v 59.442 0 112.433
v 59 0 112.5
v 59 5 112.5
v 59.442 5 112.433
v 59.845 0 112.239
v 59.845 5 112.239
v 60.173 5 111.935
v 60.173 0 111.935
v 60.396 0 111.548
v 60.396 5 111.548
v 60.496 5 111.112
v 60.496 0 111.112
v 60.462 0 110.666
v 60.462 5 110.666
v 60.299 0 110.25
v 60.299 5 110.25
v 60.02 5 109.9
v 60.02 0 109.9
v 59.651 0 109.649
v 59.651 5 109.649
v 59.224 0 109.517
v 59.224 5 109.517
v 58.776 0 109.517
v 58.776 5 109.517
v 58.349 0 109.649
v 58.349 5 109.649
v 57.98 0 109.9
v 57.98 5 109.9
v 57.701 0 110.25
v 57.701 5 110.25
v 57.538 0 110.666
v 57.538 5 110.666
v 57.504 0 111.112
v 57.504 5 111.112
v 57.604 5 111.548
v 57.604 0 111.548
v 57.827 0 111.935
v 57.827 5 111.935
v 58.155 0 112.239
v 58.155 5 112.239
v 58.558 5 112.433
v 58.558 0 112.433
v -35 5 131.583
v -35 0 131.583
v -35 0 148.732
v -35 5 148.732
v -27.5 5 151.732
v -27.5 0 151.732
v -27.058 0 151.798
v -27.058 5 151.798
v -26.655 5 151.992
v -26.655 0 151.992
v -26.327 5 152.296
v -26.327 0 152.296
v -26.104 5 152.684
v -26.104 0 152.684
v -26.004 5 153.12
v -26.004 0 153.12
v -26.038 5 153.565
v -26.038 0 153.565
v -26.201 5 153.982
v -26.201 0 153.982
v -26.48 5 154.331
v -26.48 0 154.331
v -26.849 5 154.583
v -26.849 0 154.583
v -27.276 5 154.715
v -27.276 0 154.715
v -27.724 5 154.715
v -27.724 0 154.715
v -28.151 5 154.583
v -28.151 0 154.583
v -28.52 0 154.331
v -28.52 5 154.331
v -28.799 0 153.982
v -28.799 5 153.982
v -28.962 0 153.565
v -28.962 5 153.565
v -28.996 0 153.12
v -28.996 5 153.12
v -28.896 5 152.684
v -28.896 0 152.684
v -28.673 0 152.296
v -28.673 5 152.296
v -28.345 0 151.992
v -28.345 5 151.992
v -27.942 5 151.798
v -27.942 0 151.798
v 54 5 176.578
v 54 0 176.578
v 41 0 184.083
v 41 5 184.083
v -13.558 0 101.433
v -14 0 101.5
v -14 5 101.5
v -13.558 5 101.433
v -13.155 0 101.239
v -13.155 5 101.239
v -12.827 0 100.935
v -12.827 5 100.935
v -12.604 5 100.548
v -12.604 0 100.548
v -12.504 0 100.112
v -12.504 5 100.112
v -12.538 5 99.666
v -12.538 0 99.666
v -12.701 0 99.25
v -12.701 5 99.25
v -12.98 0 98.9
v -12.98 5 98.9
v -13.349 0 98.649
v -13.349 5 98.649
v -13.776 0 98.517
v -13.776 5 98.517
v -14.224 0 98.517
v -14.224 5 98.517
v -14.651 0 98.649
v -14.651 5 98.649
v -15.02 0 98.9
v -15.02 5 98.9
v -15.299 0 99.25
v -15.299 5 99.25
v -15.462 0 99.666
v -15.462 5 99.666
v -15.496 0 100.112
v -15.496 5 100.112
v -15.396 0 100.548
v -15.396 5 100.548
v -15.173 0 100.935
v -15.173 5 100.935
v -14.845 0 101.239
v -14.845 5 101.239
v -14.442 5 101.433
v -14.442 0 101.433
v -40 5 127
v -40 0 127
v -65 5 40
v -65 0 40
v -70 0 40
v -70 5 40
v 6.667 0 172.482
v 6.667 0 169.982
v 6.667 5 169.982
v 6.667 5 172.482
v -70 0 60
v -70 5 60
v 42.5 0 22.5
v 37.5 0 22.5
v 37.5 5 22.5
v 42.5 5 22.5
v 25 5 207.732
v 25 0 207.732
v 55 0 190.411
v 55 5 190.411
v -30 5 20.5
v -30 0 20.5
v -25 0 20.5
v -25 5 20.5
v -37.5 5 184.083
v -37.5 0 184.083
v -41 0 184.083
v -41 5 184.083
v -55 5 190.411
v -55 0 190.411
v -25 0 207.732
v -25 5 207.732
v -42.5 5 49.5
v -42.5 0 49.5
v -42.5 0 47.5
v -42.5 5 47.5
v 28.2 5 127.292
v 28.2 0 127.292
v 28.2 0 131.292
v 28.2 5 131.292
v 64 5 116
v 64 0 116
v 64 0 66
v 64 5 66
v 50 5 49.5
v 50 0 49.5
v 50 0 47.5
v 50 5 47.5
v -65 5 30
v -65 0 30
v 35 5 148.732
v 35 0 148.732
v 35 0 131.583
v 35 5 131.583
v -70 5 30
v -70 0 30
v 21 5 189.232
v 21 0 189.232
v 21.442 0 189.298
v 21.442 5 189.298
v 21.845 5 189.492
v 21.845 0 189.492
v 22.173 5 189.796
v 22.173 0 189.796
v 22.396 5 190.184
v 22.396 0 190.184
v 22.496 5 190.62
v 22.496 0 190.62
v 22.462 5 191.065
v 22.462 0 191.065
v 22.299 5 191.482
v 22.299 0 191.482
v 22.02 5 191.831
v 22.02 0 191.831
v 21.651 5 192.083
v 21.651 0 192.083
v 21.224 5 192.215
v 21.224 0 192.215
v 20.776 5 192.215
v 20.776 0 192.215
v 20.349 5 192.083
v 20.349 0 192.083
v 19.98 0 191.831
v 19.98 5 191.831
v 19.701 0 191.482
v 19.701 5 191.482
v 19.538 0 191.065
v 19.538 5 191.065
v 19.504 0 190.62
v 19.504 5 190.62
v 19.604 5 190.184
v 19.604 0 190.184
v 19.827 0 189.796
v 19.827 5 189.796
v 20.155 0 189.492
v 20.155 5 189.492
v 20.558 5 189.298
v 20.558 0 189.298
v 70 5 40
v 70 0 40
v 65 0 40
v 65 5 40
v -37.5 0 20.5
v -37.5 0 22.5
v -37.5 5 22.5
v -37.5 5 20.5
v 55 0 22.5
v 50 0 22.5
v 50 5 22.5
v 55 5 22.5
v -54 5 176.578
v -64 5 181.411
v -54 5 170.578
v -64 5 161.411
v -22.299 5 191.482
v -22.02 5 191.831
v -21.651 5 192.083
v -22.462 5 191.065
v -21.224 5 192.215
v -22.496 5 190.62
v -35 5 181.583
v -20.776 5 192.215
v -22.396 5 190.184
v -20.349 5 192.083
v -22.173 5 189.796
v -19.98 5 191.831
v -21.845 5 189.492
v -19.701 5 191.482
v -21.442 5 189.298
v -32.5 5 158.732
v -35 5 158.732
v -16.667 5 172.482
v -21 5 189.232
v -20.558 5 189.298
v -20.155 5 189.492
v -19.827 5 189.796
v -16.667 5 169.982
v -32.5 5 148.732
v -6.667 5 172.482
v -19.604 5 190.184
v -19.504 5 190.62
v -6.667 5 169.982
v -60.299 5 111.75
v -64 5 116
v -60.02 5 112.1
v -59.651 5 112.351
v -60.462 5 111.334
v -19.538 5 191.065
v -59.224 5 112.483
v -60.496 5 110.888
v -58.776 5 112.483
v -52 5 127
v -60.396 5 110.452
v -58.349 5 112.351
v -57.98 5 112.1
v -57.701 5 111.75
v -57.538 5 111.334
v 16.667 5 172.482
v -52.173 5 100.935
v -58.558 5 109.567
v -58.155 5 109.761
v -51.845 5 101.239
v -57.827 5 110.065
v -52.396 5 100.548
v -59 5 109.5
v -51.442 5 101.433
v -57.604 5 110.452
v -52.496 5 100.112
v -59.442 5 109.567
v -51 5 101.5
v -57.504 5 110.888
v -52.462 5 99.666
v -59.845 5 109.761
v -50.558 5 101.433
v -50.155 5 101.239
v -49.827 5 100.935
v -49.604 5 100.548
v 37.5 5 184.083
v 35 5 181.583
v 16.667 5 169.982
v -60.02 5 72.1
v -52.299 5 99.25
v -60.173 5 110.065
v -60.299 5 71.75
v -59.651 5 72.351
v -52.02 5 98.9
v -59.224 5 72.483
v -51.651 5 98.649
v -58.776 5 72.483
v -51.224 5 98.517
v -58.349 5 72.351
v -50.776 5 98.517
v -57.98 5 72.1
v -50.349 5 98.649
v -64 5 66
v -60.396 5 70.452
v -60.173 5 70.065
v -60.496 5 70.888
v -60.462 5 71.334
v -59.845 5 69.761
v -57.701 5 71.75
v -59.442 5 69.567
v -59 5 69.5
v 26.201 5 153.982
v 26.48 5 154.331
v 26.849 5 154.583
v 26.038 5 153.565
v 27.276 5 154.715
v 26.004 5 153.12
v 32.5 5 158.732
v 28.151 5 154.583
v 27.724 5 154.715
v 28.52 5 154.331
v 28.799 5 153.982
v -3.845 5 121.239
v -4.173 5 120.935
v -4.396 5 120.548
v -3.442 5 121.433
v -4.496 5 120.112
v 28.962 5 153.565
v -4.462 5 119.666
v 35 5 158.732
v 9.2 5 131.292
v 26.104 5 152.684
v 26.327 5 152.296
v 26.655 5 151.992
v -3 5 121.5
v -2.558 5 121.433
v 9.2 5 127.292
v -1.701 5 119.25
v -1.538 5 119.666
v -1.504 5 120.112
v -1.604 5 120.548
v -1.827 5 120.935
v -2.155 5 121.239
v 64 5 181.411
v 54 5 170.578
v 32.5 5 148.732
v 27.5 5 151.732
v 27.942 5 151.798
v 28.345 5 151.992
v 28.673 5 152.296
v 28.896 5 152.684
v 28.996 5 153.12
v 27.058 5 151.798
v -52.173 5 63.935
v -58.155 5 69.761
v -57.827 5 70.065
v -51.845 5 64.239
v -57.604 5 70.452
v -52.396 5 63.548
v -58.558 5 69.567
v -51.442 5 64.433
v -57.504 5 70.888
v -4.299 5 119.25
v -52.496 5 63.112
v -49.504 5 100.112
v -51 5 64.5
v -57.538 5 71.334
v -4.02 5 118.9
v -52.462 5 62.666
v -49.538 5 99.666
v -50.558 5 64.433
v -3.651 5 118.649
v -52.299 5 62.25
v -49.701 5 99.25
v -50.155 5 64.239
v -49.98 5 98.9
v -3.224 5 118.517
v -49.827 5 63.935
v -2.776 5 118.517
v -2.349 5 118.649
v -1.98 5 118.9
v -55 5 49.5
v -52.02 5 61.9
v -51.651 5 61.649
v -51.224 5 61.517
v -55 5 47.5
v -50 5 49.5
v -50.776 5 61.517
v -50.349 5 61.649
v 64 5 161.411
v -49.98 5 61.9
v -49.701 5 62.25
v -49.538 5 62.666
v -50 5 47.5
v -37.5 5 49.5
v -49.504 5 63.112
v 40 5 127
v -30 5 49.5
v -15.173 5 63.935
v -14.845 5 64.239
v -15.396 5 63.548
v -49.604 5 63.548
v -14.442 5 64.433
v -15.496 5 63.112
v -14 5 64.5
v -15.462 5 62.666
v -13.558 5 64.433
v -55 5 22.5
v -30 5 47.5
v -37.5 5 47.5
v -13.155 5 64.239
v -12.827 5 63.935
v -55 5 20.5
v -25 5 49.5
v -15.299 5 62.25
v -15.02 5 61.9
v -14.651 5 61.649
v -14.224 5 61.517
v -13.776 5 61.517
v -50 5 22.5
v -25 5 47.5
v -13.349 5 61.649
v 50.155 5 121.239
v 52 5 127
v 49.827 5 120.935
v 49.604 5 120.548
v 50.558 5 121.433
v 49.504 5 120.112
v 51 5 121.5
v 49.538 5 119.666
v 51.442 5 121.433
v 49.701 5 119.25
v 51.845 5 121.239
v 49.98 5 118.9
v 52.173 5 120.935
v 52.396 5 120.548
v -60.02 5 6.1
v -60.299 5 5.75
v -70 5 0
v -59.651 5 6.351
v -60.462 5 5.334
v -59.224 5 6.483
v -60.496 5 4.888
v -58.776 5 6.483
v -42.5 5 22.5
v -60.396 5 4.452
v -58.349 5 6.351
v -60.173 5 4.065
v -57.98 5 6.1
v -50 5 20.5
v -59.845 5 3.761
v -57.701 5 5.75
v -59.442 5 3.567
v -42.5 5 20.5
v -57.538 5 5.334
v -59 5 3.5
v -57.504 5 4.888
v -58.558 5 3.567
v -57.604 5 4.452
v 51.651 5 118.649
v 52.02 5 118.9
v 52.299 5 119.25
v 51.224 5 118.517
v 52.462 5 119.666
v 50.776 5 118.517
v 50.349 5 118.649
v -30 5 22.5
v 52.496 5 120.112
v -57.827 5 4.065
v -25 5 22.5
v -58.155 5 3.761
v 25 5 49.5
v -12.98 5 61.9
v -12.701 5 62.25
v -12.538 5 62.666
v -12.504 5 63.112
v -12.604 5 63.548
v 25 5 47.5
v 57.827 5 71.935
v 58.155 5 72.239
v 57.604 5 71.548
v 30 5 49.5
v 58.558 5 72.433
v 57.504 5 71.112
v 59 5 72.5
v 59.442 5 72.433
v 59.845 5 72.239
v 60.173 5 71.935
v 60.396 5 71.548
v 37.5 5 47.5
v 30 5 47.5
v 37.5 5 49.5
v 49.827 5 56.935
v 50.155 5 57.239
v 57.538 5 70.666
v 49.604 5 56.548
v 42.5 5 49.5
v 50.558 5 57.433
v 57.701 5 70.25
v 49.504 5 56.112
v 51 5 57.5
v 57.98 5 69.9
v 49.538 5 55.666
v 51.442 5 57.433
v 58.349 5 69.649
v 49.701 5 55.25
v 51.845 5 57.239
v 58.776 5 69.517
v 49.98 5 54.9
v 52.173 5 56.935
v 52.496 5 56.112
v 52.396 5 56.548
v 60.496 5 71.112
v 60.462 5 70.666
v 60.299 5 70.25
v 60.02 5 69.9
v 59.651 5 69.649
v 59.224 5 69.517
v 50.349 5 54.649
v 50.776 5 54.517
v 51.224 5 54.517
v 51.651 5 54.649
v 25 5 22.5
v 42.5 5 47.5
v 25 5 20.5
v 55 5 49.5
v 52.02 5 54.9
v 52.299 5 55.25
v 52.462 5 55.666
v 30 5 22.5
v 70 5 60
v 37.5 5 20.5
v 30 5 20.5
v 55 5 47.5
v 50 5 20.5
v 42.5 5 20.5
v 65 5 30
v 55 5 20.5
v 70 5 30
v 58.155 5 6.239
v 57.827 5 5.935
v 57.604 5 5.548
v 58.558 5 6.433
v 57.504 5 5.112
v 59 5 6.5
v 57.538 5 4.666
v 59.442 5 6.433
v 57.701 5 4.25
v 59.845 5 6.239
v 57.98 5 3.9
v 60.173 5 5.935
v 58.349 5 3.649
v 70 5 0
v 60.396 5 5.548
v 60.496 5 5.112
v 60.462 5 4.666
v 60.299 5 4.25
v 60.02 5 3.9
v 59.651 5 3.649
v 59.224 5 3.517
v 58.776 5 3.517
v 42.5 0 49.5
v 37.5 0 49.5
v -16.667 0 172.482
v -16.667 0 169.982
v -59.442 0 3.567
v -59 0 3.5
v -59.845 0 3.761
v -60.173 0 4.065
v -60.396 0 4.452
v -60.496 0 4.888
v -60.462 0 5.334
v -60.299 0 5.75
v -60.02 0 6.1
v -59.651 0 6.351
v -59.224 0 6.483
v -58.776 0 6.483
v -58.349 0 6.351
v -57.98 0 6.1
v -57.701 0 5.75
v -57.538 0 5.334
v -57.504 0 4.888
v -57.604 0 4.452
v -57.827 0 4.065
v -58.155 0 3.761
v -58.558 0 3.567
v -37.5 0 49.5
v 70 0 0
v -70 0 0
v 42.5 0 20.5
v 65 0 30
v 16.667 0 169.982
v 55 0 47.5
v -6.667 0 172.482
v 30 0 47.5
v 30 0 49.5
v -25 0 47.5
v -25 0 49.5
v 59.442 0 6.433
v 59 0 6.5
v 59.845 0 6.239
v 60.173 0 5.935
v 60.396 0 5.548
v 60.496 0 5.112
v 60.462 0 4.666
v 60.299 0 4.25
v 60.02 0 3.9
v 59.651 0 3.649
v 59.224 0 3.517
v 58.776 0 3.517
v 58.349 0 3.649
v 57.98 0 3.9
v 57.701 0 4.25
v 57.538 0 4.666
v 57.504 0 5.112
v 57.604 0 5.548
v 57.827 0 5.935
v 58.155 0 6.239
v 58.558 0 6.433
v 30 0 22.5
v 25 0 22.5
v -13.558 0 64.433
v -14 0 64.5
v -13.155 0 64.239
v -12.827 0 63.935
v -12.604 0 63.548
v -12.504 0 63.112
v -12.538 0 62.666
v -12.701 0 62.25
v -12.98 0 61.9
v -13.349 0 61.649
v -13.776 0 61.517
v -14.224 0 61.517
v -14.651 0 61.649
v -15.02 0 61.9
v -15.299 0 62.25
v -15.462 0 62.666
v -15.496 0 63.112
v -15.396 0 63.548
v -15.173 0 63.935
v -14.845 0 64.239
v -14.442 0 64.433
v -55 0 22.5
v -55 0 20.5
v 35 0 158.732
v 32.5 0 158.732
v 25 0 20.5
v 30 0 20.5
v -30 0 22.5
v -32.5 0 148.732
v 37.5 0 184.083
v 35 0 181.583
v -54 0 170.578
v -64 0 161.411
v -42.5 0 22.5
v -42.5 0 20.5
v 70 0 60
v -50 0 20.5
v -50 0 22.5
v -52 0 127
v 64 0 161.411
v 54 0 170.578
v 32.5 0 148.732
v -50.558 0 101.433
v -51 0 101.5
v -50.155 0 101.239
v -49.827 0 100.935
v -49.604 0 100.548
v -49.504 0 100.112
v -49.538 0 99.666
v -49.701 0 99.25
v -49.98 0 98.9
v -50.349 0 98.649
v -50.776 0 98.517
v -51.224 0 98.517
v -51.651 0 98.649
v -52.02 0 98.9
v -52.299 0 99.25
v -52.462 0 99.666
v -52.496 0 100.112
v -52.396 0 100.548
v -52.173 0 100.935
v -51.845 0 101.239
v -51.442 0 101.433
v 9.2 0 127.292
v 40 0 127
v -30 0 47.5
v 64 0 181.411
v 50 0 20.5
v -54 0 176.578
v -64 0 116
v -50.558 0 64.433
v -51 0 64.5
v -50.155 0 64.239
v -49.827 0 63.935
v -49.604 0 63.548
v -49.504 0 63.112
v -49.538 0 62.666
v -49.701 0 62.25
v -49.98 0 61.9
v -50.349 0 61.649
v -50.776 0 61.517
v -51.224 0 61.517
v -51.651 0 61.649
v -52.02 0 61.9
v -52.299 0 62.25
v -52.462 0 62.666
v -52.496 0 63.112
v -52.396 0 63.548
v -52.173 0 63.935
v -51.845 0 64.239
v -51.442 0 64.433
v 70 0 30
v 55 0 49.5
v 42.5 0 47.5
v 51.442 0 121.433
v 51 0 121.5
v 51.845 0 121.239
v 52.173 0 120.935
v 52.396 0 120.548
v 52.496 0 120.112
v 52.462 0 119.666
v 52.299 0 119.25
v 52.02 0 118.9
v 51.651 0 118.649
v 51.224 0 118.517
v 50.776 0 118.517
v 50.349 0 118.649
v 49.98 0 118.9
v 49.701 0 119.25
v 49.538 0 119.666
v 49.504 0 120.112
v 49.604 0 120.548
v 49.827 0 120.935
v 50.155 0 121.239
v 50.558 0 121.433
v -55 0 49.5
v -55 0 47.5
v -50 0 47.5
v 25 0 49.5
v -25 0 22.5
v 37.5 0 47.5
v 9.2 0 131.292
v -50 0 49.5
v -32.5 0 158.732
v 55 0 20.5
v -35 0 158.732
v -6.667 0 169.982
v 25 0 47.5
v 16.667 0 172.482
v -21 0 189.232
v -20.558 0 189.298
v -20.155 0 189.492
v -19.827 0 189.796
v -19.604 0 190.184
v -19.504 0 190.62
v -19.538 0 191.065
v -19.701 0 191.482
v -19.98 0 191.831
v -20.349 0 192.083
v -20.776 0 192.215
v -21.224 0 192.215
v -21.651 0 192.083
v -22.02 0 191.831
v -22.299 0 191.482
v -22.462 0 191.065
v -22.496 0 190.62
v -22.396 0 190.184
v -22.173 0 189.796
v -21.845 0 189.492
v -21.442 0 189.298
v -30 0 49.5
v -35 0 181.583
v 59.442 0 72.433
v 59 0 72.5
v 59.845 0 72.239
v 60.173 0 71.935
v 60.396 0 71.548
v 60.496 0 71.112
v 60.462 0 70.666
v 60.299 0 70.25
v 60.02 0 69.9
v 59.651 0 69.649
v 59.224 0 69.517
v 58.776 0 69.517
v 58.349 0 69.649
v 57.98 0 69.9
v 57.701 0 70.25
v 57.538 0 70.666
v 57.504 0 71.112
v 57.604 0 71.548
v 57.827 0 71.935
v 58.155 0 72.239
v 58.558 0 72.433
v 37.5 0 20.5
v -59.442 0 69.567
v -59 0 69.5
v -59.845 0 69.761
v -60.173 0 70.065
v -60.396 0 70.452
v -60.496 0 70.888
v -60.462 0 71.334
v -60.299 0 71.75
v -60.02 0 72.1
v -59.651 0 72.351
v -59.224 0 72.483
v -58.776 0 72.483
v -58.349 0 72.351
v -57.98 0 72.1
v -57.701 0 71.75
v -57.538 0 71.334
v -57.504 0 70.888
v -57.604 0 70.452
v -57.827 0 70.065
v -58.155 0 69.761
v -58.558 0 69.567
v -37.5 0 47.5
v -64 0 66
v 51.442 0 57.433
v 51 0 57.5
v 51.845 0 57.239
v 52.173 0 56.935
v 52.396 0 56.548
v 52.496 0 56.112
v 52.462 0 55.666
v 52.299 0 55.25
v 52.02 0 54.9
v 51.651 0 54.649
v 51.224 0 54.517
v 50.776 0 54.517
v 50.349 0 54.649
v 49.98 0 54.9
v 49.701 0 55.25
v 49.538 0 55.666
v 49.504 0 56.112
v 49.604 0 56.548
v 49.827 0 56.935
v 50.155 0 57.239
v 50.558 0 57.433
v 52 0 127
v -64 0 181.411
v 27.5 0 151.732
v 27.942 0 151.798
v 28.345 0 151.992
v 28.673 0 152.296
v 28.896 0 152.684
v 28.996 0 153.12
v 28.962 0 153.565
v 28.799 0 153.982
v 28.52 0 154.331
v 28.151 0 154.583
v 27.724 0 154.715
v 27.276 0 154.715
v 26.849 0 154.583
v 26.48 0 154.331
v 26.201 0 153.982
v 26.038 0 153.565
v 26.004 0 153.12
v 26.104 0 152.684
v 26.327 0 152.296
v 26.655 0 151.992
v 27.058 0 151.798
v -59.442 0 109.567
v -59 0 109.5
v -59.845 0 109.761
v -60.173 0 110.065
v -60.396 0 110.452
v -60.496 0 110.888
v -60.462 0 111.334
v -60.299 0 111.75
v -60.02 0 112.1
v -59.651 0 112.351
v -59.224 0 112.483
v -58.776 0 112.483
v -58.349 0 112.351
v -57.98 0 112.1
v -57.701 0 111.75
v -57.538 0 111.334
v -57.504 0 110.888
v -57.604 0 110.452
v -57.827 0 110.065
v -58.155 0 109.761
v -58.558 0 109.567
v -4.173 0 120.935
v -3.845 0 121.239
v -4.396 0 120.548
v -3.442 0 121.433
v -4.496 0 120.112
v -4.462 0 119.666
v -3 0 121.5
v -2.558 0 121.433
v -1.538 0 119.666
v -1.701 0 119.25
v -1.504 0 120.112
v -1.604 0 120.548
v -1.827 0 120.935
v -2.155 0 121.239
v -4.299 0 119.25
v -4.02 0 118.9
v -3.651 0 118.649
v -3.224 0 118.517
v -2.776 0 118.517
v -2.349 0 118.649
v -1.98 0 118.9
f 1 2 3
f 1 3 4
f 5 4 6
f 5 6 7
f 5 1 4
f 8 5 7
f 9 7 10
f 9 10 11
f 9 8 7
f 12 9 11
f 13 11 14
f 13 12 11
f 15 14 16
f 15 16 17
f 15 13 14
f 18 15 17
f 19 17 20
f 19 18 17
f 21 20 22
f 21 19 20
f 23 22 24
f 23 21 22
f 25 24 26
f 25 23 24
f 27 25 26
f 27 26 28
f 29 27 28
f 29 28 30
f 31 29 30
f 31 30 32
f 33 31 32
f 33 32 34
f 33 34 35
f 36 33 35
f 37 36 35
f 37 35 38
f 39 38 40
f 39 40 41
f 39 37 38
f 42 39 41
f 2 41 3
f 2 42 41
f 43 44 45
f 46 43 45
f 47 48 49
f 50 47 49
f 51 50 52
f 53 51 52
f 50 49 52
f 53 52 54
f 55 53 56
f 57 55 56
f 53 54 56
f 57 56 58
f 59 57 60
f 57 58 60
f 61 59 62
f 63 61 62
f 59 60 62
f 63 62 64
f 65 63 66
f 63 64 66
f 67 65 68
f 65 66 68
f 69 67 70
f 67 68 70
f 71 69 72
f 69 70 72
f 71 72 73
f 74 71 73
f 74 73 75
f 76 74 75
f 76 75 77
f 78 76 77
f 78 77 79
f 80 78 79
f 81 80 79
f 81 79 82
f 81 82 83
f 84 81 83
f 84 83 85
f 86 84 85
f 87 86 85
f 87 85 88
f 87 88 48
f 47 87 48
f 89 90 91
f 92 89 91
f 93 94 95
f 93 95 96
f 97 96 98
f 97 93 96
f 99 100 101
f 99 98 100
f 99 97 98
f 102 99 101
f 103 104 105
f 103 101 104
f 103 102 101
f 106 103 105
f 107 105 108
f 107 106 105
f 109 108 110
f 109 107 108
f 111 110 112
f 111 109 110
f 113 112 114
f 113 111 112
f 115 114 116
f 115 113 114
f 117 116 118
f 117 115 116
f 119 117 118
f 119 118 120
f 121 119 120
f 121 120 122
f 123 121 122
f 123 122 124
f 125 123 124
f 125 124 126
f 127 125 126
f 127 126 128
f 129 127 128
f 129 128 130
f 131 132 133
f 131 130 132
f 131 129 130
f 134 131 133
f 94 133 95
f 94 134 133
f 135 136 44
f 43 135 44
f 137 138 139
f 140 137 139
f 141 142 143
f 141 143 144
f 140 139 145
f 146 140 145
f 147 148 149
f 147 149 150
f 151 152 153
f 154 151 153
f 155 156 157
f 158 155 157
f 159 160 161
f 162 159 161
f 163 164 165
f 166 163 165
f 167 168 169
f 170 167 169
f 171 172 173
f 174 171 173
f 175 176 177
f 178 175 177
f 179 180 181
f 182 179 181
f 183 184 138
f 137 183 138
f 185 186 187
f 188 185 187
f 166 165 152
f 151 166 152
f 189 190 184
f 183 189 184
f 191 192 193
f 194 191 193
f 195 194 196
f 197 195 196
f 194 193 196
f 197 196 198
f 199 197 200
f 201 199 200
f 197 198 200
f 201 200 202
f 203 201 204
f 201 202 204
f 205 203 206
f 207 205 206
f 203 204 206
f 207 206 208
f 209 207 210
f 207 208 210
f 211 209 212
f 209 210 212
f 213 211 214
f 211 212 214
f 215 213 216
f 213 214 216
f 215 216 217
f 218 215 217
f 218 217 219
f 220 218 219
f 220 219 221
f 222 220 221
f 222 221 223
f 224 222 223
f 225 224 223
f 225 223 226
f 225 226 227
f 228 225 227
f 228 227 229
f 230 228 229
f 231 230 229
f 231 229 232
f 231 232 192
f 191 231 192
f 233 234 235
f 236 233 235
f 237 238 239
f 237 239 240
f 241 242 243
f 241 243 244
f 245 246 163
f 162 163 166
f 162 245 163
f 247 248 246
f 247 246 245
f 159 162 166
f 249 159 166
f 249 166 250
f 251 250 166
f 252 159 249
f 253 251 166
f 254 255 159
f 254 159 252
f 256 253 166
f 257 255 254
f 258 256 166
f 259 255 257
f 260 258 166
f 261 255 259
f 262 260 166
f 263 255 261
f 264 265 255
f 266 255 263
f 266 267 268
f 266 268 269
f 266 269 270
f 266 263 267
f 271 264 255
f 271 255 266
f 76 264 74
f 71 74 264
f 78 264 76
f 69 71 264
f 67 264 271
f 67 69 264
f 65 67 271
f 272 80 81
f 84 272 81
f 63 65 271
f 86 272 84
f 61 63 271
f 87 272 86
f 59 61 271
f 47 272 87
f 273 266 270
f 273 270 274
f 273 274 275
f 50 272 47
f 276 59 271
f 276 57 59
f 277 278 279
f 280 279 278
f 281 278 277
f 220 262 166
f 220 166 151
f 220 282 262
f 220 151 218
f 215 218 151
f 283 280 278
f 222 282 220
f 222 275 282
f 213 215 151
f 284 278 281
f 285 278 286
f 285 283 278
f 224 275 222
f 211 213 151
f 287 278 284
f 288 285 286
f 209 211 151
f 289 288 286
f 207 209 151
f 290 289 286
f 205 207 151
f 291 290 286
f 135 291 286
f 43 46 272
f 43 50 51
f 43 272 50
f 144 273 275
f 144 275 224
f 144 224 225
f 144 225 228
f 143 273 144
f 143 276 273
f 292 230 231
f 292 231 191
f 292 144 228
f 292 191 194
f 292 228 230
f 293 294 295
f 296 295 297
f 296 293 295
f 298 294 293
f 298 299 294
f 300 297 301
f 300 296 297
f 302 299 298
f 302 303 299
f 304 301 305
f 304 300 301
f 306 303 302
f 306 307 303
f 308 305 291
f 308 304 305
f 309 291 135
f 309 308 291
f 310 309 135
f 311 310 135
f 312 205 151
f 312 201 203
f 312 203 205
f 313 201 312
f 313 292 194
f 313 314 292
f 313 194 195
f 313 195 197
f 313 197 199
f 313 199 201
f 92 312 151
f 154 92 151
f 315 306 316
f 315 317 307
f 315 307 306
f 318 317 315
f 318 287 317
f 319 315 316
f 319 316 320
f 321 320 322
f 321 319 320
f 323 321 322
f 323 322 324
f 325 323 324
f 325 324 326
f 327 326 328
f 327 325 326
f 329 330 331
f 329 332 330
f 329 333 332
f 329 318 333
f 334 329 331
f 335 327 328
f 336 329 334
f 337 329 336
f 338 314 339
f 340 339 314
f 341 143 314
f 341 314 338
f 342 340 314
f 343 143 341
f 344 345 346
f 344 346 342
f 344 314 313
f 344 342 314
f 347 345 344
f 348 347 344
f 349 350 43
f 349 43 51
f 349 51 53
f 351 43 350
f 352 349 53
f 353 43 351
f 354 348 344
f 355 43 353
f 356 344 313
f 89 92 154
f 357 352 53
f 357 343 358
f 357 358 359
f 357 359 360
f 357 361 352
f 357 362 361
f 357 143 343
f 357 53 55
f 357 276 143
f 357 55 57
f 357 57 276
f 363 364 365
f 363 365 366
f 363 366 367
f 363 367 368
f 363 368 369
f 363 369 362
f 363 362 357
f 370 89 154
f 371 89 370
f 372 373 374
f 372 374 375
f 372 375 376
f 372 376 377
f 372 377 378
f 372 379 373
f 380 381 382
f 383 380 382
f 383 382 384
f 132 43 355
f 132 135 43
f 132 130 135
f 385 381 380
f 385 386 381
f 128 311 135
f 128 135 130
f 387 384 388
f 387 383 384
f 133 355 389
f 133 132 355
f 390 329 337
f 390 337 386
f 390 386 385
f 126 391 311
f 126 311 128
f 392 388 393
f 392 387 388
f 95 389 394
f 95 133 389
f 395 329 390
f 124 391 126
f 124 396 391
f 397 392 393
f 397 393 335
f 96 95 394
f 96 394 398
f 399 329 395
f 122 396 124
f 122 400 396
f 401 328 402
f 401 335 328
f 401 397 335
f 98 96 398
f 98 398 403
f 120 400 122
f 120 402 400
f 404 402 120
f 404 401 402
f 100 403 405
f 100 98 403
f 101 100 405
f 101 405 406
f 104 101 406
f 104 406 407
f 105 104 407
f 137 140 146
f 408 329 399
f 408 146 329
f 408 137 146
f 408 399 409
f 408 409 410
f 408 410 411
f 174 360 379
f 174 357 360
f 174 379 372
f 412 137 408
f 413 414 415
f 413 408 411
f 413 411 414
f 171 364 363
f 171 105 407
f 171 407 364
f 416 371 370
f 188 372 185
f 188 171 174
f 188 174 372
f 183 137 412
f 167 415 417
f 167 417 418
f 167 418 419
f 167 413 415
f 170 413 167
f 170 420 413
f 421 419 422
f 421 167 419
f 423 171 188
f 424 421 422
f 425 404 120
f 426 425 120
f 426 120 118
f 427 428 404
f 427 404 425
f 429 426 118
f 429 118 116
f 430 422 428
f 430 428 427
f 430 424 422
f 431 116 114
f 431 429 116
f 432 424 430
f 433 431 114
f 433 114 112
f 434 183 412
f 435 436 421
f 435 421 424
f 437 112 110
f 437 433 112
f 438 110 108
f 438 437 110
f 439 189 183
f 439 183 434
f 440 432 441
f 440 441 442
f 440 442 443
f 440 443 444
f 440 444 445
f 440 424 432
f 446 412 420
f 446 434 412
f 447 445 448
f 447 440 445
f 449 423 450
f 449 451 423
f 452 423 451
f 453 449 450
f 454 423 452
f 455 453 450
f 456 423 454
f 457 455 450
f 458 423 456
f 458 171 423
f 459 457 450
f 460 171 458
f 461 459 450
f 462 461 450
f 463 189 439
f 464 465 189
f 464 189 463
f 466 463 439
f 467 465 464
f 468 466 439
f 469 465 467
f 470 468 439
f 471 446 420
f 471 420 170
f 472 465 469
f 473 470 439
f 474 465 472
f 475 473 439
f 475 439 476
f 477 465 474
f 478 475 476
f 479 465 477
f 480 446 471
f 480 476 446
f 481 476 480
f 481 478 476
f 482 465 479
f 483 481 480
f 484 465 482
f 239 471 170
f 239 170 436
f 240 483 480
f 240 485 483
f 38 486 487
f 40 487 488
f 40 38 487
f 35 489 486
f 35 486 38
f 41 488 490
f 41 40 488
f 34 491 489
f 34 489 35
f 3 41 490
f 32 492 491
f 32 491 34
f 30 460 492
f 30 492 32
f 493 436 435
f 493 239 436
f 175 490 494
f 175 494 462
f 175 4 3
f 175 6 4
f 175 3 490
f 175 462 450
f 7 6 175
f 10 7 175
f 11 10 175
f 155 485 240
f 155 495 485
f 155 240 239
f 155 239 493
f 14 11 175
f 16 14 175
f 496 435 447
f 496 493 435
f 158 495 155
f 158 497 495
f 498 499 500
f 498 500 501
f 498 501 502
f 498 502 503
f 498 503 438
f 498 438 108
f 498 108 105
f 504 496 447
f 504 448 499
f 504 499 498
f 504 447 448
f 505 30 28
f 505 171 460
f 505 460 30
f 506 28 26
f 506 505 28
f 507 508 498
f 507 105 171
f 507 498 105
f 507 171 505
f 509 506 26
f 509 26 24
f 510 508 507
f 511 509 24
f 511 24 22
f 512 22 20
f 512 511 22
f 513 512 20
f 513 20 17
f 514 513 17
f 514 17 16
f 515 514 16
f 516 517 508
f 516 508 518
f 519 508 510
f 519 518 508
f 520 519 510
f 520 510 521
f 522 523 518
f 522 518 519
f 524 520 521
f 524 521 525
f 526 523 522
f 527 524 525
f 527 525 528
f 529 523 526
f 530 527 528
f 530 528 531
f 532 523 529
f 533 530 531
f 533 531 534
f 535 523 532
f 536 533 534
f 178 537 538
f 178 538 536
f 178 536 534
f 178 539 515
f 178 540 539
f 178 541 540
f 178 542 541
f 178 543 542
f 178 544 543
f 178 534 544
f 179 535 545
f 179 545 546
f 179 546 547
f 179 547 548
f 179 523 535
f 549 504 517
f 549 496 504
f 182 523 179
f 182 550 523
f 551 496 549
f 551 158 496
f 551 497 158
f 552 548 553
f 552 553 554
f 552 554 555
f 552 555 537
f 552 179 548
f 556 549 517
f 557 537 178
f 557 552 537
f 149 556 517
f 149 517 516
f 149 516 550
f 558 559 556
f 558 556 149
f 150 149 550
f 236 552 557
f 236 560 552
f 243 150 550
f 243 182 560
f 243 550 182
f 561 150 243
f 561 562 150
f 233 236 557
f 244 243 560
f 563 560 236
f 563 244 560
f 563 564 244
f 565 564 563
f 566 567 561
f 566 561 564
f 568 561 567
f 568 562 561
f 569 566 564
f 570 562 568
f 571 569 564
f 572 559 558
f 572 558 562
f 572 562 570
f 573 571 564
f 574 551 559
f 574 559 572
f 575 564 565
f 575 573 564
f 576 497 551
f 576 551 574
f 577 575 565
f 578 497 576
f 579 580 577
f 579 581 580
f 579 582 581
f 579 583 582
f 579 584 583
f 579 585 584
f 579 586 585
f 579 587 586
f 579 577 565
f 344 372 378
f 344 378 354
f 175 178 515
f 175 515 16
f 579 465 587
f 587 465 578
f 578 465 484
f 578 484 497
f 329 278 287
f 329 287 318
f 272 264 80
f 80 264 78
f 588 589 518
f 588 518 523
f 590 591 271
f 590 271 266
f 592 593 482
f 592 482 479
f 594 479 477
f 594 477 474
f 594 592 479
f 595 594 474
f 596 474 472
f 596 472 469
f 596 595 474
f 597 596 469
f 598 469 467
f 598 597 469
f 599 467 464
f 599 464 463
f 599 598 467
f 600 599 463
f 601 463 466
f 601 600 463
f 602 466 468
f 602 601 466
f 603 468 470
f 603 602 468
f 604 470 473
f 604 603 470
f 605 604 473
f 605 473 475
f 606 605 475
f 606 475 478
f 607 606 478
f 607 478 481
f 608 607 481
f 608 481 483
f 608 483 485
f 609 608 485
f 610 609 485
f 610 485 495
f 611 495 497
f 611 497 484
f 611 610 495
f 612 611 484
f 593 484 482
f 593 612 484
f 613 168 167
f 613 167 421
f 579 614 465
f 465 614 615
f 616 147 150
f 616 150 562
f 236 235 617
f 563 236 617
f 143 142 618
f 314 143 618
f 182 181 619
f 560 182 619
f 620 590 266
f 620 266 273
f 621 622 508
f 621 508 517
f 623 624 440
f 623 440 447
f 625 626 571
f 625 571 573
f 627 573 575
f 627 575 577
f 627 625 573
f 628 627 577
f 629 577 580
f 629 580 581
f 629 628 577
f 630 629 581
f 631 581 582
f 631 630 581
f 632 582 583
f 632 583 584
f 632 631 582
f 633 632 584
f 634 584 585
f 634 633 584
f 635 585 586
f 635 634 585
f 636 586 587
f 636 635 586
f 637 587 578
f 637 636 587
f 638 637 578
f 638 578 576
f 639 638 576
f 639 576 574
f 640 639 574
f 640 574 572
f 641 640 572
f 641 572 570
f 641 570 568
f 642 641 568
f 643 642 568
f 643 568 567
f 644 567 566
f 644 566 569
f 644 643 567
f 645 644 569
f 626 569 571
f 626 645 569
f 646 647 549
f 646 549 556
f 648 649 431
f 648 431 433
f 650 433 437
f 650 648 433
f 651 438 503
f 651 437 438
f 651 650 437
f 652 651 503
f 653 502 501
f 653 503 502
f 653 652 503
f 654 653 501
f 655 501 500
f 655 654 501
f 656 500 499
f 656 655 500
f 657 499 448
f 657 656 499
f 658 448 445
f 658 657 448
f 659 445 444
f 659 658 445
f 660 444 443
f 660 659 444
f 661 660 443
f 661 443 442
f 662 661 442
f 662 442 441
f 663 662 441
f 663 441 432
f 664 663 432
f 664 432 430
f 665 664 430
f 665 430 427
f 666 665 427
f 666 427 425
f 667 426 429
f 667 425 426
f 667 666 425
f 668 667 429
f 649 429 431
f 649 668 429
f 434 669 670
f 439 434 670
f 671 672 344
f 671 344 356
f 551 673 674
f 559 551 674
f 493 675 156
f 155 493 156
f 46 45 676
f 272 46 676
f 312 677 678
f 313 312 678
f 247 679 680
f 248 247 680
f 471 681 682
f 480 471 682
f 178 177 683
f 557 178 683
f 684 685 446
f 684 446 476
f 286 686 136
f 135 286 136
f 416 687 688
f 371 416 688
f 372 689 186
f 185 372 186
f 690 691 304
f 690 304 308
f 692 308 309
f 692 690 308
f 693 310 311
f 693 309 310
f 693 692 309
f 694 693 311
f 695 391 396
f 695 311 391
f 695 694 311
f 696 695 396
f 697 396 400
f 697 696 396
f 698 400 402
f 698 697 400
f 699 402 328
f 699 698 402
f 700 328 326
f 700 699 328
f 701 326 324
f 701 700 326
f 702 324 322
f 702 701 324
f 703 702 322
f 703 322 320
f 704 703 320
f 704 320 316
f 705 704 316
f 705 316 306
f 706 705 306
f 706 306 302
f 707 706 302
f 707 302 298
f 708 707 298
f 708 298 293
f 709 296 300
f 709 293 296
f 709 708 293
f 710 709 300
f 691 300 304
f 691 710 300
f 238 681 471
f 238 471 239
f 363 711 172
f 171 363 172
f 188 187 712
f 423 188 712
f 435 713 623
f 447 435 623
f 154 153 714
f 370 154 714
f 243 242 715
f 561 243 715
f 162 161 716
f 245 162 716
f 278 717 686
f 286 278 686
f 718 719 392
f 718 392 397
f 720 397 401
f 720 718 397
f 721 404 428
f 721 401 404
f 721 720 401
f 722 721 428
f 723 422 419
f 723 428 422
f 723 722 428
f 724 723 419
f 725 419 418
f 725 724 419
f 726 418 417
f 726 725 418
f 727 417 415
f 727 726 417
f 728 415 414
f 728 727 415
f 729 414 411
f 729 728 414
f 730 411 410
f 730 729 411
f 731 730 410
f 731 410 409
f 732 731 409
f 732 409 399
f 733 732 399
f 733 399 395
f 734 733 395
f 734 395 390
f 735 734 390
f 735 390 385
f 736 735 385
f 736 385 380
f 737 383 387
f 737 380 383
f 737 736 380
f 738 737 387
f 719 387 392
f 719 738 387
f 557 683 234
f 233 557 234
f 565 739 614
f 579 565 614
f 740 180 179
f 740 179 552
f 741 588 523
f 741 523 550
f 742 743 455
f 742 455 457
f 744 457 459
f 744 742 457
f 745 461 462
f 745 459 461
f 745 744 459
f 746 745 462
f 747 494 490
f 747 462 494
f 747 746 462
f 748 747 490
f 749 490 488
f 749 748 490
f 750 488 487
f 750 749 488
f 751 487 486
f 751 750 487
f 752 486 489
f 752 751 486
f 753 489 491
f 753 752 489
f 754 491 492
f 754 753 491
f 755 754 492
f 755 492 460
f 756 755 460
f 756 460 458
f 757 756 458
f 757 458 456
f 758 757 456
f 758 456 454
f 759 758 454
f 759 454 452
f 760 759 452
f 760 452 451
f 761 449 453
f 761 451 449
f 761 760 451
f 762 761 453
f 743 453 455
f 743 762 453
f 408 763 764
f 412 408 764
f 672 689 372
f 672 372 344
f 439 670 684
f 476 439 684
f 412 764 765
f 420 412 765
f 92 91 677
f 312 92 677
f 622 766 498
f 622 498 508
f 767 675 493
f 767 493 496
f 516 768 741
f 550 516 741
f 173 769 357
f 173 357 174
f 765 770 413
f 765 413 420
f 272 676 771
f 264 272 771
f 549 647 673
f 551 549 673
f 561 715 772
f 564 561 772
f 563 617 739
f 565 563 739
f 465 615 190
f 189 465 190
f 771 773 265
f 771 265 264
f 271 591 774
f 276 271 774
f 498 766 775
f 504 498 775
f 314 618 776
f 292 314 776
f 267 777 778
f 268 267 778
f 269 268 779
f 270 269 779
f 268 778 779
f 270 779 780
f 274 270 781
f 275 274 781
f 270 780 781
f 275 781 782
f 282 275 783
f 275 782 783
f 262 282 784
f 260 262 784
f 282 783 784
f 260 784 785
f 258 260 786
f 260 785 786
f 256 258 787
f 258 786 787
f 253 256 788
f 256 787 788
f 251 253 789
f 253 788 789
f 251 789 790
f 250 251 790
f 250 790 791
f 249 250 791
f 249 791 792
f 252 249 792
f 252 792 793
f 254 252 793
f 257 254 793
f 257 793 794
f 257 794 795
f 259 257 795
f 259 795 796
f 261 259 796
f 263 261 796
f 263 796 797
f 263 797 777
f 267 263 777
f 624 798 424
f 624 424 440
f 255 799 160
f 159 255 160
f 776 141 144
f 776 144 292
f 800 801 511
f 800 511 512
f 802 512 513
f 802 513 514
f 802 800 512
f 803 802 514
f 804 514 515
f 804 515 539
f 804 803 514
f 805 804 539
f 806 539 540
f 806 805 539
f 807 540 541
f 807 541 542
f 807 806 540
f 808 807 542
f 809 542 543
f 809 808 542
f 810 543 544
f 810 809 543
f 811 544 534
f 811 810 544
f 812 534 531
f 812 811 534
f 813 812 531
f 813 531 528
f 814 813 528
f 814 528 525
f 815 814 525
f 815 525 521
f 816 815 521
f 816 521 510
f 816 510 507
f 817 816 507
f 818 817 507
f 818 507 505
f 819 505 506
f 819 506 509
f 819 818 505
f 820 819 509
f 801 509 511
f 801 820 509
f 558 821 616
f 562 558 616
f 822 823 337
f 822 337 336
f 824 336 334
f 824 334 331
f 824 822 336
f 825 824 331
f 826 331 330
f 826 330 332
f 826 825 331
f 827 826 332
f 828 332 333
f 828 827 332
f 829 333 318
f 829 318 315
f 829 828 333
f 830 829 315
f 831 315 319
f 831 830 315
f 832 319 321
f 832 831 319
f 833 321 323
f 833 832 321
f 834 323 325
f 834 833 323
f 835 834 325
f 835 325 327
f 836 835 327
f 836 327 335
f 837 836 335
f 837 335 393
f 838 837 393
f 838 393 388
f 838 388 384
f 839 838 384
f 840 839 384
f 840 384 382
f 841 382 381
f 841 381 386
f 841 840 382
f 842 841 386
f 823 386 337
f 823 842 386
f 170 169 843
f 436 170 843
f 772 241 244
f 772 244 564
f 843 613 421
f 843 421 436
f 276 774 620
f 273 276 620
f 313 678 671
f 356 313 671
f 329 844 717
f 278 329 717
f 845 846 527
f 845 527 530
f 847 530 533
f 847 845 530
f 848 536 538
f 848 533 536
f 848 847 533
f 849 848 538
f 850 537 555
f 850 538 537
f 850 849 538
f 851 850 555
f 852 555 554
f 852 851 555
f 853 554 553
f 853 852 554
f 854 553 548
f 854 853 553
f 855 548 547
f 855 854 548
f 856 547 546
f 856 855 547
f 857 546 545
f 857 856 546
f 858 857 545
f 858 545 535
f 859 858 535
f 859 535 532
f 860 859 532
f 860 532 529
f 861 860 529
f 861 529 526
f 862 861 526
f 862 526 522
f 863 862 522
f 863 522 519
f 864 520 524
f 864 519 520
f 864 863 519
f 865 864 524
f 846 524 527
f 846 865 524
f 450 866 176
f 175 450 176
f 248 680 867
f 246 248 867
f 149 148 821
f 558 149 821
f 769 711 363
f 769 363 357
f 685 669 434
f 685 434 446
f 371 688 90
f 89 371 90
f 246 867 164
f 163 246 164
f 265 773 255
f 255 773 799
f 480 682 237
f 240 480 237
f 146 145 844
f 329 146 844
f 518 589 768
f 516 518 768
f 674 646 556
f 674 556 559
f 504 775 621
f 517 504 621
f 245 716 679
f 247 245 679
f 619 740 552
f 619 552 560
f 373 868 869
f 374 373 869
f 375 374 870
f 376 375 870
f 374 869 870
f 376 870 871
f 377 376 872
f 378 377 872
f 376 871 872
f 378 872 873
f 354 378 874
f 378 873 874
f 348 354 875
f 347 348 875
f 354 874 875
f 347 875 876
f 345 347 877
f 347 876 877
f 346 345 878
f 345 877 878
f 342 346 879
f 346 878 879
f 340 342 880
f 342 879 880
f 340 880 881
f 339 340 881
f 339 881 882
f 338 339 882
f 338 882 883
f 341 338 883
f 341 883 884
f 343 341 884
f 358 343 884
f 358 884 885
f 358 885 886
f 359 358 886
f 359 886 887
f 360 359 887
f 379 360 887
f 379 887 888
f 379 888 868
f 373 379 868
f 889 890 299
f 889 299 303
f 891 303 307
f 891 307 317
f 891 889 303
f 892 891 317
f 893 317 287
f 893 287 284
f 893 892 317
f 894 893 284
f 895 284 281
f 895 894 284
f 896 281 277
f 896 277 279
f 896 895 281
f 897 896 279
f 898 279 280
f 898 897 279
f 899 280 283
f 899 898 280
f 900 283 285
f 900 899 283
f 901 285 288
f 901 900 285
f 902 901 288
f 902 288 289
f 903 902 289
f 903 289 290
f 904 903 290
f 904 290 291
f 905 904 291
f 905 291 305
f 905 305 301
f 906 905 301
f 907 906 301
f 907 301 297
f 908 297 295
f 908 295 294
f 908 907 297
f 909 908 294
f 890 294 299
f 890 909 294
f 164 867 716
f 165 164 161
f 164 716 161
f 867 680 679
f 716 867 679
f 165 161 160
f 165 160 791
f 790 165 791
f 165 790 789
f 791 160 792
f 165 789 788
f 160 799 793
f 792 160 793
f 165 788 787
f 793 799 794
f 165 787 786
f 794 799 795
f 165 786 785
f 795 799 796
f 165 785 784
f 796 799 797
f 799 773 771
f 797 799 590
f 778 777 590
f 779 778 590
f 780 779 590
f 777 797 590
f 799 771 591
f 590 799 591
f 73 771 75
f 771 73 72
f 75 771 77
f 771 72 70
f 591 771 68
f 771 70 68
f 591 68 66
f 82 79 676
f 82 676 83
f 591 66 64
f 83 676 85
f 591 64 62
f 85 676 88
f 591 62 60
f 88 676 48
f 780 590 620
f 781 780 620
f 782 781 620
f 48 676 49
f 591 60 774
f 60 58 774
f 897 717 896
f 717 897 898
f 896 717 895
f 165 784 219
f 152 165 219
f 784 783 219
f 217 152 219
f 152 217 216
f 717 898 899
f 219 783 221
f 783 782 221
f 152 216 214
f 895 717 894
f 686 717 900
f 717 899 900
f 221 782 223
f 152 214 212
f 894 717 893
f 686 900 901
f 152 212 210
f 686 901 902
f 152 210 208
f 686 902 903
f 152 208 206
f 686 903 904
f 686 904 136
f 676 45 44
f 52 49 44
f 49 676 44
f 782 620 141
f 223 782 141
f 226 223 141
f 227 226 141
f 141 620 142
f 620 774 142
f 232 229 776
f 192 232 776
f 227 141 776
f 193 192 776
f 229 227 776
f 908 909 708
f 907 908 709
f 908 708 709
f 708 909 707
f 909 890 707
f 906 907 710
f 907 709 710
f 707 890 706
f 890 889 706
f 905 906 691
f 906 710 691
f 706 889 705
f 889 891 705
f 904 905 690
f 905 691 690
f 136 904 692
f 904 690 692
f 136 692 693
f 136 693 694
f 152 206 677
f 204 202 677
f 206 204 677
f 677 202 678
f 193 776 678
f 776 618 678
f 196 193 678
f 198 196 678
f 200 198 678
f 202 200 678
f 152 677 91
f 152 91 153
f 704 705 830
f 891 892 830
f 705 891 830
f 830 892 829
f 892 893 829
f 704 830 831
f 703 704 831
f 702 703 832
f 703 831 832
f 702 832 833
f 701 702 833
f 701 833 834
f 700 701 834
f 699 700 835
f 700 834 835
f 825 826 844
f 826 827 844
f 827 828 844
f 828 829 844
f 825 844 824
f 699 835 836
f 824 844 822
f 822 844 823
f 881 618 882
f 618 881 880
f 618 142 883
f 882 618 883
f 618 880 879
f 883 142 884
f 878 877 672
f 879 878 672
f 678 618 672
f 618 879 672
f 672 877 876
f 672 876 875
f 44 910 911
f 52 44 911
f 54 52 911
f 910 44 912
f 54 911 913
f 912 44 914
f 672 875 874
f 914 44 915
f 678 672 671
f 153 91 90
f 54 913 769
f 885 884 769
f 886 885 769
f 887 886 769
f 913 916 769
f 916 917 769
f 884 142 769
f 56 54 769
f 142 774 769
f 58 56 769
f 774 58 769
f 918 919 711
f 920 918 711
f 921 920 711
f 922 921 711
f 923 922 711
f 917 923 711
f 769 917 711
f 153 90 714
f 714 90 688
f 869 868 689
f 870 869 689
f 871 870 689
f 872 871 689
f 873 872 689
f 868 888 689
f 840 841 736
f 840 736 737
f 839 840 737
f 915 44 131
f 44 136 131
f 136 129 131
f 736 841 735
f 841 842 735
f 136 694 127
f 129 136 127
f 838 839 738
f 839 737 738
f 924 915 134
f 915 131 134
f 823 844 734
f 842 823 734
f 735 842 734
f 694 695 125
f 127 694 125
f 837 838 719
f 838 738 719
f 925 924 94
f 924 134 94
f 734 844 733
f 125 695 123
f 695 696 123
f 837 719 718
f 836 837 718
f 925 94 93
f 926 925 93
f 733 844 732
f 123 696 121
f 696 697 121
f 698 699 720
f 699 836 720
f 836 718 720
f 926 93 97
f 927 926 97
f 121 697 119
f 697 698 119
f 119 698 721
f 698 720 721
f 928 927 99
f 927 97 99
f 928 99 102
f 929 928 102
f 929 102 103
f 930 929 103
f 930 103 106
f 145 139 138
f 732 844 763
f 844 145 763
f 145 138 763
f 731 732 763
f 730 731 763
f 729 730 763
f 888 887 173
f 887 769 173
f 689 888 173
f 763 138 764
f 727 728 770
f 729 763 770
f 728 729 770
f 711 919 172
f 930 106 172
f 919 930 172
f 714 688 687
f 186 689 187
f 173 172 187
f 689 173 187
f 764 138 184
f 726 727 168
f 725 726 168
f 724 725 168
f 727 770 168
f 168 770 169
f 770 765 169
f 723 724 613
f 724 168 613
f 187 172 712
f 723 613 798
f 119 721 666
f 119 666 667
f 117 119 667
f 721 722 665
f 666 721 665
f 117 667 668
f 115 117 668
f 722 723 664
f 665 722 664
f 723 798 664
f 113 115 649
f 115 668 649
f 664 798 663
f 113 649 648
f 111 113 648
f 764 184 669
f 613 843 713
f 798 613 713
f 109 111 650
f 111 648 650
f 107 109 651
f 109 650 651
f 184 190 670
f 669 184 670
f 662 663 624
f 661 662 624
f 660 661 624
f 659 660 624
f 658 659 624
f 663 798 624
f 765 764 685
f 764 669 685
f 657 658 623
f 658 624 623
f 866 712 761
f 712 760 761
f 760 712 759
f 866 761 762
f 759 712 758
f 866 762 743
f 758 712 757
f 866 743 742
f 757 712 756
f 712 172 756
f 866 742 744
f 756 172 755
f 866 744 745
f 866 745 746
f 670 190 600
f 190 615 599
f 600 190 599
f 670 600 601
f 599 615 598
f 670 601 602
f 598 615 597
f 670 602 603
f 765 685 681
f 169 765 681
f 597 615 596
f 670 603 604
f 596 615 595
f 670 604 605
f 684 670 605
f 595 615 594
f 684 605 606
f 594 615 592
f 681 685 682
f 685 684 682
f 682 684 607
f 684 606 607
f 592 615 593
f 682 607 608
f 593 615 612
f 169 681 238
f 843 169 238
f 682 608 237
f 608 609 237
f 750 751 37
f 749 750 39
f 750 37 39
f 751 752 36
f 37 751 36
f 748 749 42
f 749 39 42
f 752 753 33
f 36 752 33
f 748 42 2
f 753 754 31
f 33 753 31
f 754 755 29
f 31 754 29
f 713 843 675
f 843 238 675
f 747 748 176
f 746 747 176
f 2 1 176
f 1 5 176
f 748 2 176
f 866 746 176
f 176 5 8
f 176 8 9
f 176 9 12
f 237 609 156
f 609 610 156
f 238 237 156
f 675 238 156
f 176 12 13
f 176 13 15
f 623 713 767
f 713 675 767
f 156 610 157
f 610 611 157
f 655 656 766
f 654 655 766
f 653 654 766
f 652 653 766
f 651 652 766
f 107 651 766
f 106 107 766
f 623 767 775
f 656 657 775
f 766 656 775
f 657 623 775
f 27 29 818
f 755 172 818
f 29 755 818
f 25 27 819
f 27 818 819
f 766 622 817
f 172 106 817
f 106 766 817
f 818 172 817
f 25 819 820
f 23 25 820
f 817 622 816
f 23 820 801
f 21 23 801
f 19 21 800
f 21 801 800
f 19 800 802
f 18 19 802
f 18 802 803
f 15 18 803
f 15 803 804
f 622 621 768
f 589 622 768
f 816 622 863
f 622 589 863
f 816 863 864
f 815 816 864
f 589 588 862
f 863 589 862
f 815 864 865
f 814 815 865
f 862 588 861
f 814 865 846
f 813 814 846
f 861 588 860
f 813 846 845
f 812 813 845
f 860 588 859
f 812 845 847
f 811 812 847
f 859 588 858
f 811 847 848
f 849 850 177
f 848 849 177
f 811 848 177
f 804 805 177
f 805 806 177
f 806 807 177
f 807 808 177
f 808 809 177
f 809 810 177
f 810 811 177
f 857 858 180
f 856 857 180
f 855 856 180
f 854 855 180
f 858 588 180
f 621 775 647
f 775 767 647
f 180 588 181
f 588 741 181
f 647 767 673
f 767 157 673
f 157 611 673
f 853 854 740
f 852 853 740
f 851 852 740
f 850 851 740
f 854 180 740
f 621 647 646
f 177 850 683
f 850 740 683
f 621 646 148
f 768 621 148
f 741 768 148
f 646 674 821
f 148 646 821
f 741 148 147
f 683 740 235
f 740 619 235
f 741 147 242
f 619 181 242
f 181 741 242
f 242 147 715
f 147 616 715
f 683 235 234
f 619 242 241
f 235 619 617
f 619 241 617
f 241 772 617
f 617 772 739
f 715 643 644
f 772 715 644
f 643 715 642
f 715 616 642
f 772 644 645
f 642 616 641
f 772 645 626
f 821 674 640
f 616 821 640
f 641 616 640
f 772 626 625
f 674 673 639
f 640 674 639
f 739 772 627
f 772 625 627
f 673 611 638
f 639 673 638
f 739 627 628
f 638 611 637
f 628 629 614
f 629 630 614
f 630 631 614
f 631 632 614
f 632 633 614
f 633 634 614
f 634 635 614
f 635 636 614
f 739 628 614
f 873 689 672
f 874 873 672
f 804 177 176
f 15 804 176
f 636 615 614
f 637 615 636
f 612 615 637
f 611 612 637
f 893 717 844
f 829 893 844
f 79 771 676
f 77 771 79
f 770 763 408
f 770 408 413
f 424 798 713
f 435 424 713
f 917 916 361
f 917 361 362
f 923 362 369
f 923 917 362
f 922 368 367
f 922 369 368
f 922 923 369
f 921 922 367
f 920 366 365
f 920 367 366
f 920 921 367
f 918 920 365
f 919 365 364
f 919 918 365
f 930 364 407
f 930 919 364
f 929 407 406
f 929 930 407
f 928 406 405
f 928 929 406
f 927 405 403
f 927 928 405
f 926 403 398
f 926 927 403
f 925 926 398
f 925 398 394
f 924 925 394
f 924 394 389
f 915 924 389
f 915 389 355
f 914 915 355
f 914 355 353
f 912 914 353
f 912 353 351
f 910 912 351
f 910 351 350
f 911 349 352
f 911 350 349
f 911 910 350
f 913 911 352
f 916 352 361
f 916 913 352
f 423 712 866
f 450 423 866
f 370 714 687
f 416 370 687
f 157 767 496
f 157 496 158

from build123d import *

# Parameters (mm, degrees)
SKETCH1_R               = 1.5
SKETCH1_W               = 5
SKETCH1_H               = 2
BOSS_EXTRUDE1_DEPTH     = 5
SENSOR_POS_R            = 1.5
SENSOR_POS_W            = 2.5
SENSOR_POS_H            = 10
SENSOR_POS_W_2          = 19
SENSOR_POS_H_2          = 4
SENSOR_POS_W_3          = 10
SENSOR_POS_H_3          = 2.5
CUT_EXTRUDE1_DEPTH      = 220.265652723
CUT_EXTRUDE2_DEPTH      = 220.265652723
CUT_EXTRUDE2_DEPTH_BACK = 220.265652723
SKETCH2_R               = 1.5


with BuildPart() as part:
    # Sketch1 → Boss-Extrude1 (new body)
    with BuildSketch(Plane(origin=(0, 0, 0), x_dir=(1, 0, 0), z_dir=(0, 1, 0))):
        Polygon((55, -190.411113167), (64, -181.411113167), (64, -161.411113167), (54, -170.577779834), (54, -176.577779834), (41, -184.083333333), (37.5, -184.083333333), (35, -181.583333333), (35, -131.583333333), (40, -127), (52, -127), (64, -116), (64, -66), (70, -60), (70, -40), (65, -40), (65, -30), (70, -30), (70, 0), (-70, 0), (-70, -30), (-65, -30), (-65, -40), (-70, -40), (-70, -60), (-64, -66), (-64, -116), (-52, -127), (-40, -127), (-35, -131.583333333), (-35, -181.583333333), (-37.5, -184.083333333), (-41, -184.083333333), (-54, -176.577779834), (-54, -170.577779834), (-64, -161.411113167), (-64, -181.411113167), (-55, -190.411113167), (-25, -207.731621243), (25, -207.731621243), align=None)
        with Locations(Location((59, -5, 0), (0, 0, 270))):
            Circle(SKETCH1_R, mode=Mode.SUBTRACT)
        with Locations(Location((59, -71, 0), (0, 0, 270))):
            Circle(SKETCH1_R, mode=Mode.SUBTRACT)
        with Locations(Location((59, -111, 0), (0, 0, 270))):
            Circle(SKETCH1_R, mode=Mode.SUBTRACT)
        with Locations(Location((-59, -111, 0), (0, 0, 90))):
            Circle(SKETCH1_R, mode=Mode.SUBTRACT)
        with Locations(Location((-59, -71, 0), (0, 0, 90))):
            Circle(SKETCH1_R, mode=Mode.SUBTRACT)
        with Locations(Location((-59, -5, 0), (0, 0, 90))):
            Circle(SKETCH1_R, mode=Mode.SUBTRACT)
        with Locations((52.5, -21.5)):
            Rectangle(SKETCH1_W, SKETCH1_H, mode=Mode.SUBTRACT)
        with Locations((40, -21.5)):
            Rectangle(SKETCH1_W, SKETCH1_H, mode=Mode.SUBTRACT)
        with Locations((27.5, -21.5)):
            Rectangle(SKETCH1_W, SKETCH1_H, mode=Mode.SUBTRACT)
        with Locations((52.5, -48.5)):
            Rectangle(SKETCH1_W, SKETCH1_H, mode=Mode.SUBTRACT)
        with Locations((40, -48.5)):
            Rectangle(SKETCH1_W, SKETCH1_H, mode=Mode.SUBTRACT)
        with Locations((27.5, -48.5)):
            Rectangle(SKETCH1_W, SKETCH1_H, mode=Mode.SUBTRACT)
        with Locations((-52.5, -48.5)):
            Rectangle(SKETCH1_W, SKETCH1_H, mode=Mode.SUBTRACT)
        with Locations((-40, -48.5)):
            Rectangle(SKETCH1_W, SKETCH1_H, mode=Mode.SUBTRACT)
        with Locations((-27.5, -48.5)):
            Rectangle(SKETCH1_W, SKETCH1_H, mode=Mode.SUBTRACT)
        with Locations((-52.5, -21.5)):
            Rectangle(SKETCH1_W, SKETCH1_H, mode=Mode.SUBTRACT)
        with Locations((-40, -21.5)):
            Rectangle(SKETCH1_W, SKETCH1_H, mode=Mode.SUBTRACT)
        with Locations((-27.5, -21.5)):
            Rectangle(SKETCH1_W, SKETCH1_H, mode=Mode.SUBTRACT)
    extrude(amount=BOSS_EXTRUDE1_DEPTH)

    # Sensor Pos → Cut-Extrude1 (cut, through all)
    with BuildSketch(Plane.XZ):
        with Locations(Location((27.5, 153.231621243, 0), (0, 0, 270))):
            Circle(SENSOR_POS_R)
        with Locations(Location((-27.5, 153.231621243, 0), (0, 0, 270))):
            Circle(SENSOR_POS_R)
        with Locations(Location((-21, 190.731621243, 0), (0, 0, 270))):
            Circle(SENSOR_POS_R)
        with Locations(Location((21, 190.731621243, 0), (0, 0, 270))):
            Circle(SENSOR_POS_R)
        with Locations((-33.75, 153.731621243)):
            Rectangle(SENSOR_POS_W, SENSOR_POS_H)
        with Locations((33.75, 153.731621243)):
            Rectangle(SENSOR_POS_W, SENSOR_POS_H)
        with Locations((18.7, 129.291666667)):
            Rectangle(SENSOR_POS_W_2, SENSOR_POS_H_2)
        with Locations((-11.666666667, 171.231621243)):
            Rectangle(SENSOR_POS_W_3, SENSOR_POS_H_3)
        with Locations((11.666666667, 171.231621243)):
            Rectangle(SENSOR_POS_W_3, SENSOR_POS_H_3)
    extrude(amount=-CUT_EXTRUDE1_DEPTH, mode=Mode.SUBTRACT)

    # Sketch2 → Cut-Extrude2 (cut, two sides: drawn at the far end of the back side and taken through both)
    with BuildSketch(Plane(origin=(0, 5, 0), x_dir=(1, 0, 0), z_dir=(0, 1, 0)).offset(-CUT_EXTRUDE2_DEPTH_BACK)):
        with Locations(Location((-51, -63, 0), (0, 0, 270))):
            Circle(SKETCH2_R)
        with Locations(Location((-14, -63, 0), (0, 0, 270))):
            Circle(SKETCH2_R)
        with Locations(Location((-51, -100, 0), (0, 0, 270))):
            Circle(SKETCH2_R)
        with Locations(Location((-14, -100, 0), (0, 0, 270))):
            Circle(SKETCH2_R)
        with Locations(Location((51, -56, 0), (0, 0, 270))):
            Circle(SKETCH2_R)
        with Locations(Location((-3, -120, 0), (0, 0, 270))):
            Circle(SKETCH2_R)
        with Locations(Location((51, -120, 0), (0, 0, 270))):
            Circle(SKETCH2_R)
    extrude(amount=CUT_EXTRUDE2_DEPTH + CUT_EXTRUDE2_DEPTH_BACK, mode=Mode.SUBTRACT)


solid = part.part
